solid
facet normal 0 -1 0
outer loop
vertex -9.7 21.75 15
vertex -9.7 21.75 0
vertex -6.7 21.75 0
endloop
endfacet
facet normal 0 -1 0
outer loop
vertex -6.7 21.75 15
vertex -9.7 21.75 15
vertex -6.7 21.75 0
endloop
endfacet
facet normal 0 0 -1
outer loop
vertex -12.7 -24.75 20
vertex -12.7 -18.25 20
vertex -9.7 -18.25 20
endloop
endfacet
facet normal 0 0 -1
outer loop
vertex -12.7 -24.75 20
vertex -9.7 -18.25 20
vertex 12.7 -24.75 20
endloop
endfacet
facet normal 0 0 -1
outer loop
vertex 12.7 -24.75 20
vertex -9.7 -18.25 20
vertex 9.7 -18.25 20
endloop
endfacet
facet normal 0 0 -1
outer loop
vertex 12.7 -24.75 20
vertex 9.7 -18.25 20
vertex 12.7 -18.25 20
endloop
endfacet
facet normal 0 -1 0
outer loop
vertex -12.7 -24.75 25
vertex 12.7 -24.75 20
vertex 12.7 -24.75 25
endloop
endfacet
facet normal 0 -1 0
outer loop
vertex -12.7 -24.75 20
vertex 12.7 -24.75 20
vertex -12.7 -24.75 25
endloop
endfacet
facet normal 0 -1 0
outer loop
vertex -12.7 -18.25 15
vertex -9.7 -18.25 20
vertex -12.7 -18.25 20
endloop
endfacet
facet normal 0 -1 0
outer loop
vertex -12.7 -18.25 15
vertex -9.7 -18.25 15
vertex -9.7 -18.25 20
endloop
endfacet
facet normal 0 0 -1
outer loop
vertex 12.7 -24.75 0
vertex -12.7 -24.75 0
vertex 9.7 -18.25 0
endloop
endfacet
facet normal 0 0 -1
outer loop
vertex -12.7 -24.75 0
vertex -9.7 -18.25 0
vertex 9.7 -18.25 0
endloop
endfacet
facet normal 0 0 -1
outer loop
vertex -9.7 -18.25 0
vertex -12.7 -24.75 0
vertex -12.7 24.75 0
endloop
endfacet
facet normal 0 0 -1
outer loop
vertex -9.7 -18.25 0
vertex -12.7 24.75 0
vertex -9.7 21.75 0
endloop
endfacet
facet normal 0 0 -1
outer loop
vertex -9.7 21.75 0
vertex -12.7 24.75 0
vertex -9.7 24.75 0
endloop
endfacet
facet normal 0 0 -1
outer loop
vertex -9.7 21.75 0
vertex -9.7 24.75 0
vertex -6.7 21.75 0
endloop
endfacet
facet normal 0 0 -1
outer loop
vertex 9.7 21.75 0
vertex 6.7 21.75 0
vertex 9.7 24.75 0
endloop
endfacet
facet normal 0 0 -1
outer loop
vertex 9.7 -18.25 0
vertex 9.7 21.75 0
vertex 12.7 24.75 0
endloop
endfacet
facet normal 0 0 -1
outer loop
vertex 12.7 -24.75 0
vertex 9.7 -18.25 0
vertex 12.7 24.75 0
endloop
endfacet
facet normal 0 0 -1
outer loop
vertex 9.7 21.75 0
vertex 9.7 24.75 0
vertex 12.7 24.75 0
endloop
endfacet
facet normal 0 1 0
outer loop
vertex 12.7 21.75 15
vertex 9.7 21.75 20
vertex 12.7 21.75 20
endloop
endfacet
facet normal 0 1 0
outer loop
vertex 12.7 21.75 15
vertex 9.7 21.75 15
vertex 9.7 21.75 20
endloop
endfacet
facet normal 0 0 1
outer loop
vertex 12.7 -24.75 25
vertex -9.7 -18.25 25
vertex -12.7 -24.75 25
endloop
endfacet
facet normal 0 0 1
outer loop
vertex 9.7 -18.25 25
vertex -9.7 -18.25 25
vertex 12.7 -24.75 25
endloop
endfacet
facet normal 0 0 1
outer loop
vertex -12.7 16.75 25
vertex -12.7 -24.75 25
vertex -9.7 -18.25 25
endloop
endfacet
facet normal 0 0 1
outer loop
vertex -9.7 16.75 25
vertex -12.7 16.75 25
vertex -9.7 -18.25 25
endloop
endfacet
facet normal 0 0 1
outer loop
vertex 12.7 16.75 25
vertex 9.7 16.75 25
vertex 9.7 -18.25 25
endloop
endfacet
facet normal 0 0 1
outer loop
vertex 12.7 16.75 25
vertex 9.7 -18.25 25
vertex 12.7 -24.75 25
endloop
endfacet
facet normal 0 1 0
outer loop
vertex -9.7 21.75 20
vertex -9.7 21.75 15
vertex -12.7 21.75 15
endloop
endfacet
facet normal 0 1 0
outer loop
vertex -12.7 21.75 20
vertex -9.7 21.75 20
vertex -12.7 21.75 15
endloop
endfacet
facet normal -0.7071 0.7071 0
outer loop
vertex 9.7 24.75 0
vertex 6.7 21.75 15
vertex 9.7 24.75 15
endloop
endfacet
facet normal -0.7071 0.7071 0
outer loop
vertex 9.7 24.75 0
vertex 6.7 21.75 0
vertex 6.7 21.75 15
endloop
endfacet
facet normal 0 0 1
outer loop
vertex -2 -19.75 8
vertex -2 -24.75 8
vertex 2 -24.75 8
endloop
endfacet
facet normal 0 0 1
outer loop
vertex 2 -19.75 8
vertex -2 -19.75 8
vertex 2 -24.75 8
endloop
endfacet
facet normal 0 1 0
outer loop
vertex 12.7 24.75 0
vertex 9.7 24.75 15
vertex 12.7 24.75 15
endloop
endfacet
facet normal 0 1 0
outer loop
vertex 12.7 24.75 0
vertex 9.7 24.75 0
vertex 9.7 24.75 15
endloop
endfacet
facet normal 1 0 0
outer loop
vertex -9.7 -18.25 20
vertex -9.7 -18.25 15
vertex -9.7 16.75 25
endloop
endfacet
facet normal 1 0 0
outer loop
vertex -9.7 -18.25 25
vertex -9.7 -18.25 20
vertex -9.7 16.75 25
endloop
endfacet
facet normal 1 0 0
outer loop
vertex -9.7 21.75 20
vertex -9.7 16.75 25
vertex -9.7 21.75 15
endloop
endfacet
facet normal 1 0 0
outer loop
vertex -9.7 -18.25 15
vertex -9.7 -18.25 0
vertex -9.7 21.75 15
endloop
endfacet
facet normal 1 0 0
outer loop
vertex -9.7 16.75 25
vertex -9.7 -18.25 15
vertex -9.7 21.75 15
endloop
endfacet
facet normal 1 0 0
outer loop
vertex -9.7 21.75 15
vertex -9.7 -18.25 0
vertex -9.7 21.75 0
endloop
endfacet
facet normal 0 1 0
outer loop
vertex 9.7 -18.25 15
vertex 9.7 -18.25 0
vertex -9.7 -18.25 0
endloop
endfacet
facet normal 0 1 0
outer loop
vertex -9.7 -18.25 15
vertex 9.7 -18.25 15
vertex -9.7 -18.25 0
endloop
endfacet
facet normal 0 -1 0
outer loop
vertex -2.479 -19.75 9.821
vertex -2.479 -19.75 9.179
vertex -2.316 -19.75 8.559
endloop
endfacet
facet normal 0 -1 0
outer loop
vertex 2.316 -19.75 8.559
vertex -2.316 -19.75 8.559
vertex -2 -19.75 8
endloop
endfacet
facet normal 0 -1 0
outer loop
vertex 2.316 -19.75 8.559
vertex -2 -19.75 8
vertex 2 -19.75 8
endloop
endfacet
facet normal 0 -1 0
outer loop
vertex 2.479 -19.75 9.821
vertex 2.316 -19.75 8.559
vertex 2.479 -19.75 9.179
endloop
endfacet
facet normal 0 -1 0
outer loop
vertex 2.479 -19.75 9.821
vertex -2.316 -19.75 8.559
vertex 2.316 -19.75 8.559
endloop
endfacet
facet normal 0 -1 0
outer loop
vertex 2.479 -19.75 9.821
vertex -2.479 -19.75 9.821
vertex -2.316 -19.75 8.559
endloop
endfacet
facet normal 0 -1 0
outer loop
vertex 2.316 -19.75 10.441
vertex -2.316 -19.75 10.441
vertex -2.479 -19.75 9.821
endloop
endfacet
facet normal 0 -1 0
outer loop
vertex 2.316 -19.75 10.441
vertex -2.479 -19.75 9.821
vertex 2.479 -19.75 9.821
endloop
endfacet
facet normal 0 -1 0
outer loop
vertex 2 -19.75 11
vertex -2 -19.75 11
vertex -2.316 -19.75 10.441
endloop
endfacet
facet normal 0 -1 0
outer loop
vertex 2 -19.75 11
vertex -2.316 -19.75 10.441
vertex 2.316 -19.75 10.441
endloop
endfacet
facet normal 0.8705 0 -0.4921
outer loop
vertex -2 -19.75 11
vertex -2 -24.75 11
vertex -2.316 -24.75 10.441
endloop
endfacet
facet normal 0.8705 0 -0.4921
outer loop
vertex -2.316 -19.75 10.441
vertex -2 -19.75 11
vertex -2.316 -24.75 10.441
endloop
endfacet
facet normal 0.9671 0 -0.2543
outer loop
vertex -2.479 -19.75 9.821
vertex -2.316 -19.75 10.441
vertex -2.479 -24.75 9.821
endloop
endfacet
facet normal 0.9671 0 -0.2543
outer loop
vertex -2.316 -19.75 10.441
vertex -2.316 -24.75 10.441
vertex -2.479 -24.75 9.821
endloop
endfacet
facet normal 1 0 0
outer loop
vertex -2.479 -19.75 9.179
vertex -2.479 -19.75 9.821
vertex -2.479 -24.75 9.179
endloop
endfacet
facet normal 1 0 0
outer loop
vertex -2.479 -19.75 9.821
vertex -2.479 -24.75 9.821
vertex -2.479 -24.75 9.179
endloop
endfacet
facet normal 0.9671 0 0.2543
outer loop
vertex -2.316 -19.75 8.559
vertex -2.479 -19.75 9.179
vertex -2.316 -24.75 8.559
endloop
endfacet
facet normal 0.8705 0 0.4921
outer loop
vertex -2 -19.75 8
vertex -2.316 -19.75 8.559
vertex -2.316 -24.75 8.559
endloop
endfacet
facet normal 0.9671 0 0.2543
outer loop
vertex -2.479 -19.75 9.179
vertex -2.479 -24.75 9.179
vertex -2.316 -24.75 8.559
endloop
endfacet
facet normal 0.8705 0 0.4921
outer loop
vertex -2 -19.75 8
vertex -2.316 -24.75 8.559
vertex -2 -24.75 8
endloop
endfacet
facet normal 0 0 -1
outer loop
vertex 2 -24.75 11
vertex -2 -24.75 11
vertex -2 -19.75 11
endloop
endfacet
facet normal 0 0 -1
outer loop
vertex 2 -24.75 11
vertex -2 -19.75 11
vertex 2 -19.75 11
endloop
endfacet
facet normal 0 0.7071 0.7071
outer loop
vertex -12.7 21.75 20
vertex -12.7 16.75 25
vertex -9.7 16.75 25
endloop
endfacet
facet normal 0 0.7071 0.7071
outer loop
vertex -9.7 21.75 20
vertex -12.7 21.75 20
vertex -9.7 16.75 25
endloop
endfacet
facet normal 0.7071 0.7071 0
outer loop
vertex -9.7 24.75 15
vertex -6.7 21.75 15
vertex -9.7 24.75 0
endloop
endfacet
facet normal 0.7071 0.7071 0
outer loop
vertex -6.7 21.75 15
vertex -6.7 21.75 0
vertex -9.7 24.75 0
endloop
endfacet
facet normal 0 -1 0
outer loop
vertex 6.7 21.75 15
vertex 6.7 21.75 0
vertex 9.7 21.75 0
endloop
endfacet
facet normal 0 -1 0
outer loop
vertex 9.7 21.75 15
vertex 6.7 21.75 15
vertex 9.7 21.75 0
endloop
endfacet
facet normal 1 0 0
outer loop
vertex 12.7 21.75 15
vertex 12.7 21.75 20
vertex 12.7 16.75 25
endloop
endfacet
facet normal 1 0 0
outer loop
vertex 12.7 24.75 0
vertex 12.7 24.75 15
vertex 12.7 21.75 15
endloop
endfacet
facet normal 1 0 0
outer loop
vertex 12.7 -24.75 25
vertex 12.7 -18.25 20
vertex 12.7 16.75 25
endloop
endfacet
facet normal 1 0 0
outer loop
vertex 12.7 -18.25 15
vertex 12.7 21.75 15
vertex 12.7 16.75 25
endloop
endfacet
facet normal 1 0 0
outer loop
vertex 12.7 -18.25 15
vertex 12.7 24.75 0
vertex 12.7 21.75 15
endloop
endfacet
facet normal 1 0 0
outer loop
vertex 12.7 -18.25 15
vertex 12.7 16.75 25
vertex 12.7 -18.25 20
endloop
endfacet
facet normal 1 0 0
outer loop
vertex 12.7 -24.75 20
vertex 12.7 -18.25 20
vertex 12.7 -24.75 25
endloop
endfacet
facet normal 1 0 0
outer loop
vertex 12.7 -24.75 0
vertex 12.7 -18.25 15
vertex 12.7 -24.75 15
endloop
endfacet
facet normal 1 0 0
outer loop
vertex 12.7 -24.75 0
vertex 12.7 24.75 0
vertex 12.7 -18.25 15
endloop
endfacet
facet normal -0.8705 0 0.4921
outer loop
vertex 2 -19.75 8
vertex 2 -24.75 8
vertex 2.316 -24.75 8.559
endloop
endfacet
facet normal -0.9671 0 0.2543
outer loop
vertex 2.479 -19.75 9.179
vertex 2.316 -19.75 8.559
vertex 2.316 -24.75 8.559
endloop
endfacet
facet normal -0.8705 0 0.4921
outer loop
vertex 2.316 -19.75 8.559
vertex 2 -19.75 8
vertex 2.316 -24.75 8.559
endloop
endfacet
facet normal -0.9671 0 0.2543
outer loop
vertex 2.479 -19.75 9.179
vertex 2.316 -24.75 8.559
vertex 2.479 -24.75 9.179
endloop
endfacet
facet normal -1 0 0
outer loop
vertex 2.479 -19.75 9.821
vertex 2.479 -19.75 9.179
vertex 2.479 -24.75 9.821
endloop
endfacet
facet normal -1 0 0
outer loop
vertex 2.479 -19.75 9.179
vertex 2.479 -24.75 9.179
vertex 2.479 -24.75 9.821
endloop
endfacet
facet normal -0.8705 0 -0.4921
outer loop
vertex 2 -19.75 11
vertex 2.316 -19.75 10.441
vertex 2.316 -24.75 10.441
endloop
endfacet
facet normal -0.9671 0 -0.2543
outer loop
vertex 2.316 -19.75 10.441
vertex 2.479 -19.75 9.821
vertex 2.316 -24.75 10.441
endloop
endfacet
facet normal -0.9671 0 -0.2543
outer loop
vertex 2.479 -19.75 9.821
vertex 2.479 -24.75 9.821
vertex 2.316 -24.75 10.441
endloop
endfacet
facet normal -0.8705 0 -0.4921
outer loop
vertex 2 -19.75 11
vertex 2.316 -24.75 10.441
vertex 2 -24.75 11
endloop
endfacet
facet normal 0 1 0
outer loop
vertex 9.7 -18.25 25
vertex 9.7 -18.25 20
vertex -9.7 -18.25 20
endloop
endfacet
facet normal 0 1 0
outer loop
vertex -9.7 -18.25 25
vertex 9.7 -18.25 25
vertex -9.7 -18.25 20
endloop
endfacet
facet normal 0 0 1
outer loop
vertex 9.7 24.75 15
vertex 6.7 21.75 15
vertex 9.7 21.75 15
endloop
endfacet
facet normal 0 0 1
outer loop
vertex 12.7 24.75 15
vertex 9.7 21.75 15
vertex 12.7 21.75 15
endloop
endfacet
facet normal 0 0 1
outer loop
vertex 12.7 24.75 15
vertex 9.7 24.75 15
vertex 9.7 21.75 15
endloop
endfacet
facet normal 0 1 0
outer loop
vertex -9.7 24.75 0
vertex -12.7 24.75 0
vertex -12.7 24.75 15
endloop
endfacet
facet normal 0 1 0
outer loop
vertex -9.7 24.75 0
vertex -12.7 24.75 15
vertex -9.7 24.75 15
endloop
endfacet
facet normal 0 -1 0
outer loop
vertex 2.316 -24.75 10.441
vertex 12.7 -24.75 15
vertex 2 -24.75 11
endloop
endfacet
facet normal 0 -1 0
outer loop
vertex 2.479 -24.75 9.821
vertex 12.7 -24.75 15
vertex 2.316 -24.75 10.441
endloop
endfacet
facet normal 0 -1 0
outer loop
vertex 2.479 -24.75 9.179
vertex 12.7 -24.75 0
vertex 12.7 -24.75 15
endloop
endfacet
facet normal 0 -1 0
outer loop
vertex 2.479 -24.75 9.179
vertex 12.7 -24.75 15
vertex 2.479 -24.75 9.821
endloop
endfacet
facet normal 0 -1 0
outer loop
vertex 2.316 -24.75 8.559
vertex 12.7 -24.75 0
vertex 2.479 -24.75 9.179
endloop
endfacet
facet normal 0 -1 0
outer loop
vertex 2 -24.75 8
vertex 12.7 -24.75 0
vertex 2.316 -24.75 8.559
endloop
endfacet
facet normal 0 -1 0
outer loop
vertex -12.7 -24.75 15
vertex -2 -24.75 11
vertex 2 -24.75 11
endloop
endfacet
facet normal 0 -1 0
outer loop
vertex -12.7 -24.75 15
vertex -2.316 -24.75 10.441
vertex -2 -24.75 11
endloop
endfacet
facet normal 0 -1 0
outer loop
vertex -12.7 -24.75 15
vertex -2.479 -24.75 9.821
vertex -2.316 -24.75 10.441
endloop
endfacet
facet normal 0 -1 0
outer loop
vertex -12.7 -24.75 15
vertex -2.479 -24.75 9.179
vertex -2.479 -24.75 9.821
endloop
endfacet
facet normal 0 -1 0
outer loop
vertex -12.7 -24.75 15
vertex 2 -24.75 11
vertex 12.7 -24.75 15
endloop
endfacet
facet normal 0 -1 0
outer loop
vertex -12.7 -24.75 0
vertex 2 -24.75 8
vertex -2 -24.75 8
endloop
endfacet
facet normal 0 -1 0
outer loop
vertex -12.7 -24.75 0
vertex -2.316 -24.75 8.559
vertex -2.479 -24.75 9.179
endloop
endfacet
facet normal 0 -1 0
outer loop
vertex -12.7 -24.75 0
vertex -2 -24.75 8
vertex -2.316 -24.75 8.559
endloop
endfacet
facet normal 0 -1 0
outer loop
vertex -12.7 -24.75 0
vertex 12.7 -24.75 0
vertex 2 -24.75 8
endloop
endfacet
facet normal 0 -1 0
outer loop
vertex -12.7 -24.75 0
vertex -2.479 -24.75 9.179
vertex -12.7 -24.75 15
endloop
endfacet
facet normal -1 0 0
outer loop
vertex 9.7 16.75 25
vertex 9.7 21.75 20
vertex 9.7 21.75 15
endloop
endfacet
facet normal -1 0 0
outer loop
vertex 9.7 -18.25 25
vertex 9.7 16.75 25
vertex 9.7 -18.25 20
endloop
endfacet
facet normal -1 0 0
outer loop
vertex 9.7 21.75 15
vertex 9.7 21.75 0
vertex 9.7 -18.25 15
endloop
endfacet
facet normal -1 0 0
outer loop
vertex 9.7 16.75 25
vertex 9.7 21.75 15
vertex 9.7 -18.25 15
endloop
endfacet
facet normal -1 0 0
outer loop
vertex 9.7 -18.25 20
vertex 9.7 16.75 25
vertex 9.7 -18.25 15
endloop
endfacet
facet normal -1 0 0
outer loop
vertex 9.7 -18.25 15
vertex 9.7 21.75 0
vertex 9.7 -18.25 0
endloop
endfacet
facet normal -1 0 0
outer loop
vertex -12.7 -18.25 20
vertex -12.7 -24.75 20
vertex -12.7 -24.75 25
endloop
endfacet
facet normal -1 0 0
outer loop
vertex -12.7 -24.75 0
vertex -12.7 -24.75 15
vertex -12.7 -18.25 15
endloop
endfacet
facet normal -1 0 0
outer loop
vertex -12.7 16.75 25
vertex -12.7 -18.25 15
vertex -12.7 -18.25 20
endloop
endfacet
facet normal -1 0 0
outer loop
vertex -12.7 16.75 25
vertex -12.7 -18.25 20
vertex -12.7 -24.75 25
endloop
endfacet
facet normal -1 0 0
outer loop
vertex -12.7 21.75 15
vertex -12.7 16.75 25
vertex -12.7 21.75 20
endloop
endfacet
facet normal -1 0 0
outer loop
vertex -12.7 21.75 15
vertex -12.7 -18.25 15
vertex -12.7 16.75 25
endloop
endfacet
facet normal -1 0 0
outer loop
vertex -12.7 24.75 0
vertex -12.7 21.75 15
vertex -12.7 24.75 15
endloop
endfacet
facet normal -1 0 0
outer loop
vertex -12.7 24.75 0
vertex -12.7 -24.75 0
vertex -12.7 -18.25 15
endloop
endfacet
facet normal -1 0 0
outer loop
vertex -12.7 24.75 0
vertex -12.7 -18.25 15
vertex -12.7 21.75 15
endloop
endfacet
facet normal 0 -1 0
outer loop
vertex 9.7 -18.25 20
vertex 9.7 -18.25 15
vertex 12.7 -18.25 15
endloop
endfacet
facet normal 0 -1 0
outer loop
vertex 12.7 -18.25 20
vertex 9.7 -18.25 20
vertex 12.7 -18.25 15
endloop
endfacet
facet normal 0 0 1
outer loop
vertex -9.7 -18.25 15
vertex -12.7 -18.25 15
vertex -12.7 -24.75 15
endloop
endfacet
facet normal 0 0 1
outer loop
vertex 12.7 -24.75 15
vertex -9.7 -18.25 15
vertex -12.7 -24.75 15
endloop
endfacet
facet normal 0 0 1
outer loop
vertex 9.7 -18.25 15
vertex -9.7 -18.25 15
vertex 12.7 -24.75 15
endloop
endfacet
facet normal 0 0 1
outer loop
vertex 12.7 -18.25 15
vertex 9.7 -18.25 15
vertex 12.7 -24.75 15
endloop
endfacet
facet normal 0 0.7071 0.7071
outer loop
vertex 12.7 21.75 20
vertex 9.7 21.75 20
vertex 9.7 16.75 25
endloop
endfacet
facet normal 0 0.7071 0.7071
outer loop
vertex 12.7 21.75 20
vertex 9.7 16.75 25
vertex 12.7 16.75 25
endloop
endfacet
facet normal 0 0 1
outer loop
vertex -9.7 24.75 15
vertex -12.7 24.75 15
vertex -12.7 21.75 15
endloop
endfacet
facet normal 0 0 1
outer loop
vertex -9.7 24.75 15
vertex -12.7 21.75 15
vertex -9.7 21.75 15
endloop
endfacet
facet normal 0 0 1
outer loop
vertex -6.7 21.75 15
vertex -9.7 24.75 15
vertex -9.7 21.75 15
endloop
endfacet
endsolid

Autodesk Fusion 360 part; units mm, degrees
sketch "Schizzo1" plane through (0, 0, 0) normal (0, 0, 1) x (1, 0, 0)
  line L0 (12.7, -24.75) -> (-12.7, -24.75)
  line L1 (-12.7, -24.75) -> (-12.7, 24.75)
  line L2 (12.7, 24.75) -> (12.7, -24.75)
  line L3 (12.7, -24.75) -> (-12.7, 24.75) construction
  line L4 (-12.7, -24.75) -> (12.7, 24.75) construction
  line L5 (9.7, -18.25) -> (-9.7, -18.25)
  line L6 (9.7, 21.75) -> (9.7, -18.25)
  line L7 (-9.7, -18.25) -> (-9.7, 21.75)
  line L8 (-12.7, 24.75) -> (-9.7, 24.75)
  line L9 (9.7, 24.75) -> (12.7, 24.75)
  line L10 (-9.7, 21.75) -> (-6.7, 21.75)
  line L11 (-6.7, 21.75) -> (-9.7, 24.75)
  line L12 (9.7, 21.75) -> (6.7, 21.75)
  line L13 (6.7, 21.75) -> (9.7, 24.75)
  line L14 (-9.7, -18.25) -> (-12.7, -18.25)
  line L15 (9.7, -18.25) -> (12.7, -18.25)
  line L16 (-9.7, 21.75) -> (-12.7, 21.75)
  line L17 (9.7, 21.75) -> (12.7, 21.75)
  dimension "d15" = 19.4
  dimension "d16" = 3
  dimension "d17" = 3
  dimension "d18" = 6.5
  dimension "d19" = 43
  dimension "d20" = 3
  dimension "d22" = 3
  dimension "d23" = 3
  dimension "d24" = 3
extrude "Estrusione2" add sketch "Schizzo1" along normal blind 25 contours L0 L1 L2 L5 L14 L15 | L2 L6 L15 L17 | L1 L7 L14 L16
extrude "Estrusione3" add sketch "Schizzo1" along normal blind 15 contours L2 L9 L12 L13 L17 | L1 L8 L10 L11 L16
extrude "Estrusione4" cut sketch "Schizzo1" along normal blind 5 from surface at 15 contours L0 L1 L2 L5 L14 L15
chamfer "Smusso1" distance 5 angle 45 2 edges at (11.2, 21.75, 25) (-11.2, 21.75, 25)
sketch "Schizzo2" plane through (0, -24.75, 0) normal (0, -1, 0) x (1, 0, 0)
  line L0 (12.7, 15) -> (-12.7, 15)
  line L1 (-12.7, 15) -> (-12.7, 0)
  line L2 (-12.7, 0) -> (12.7, 0)
  line L3 (12.7, 0) -> (12.7, 15)
  line L4 (0, 15) -> (0, 0) construction
  circle A0 centre (0, 9.5) radius 2.5
  line L5 (-2, 11) -> (2, 11)
  line L6 (-2, 8) -> (2, 8)
  line L7 (-2.5, 9.5) -> (2.5, 9.5) construction
  dimension "d33" = 5
  dimension "d34" = 3
  dimension "d35" = 3
extrude "Estrusione5" cut sketch "Schizzo2" against normal blind 5 contours A0 L5 L6
equation "d17 = d16"
equation "d20 = spessore"
equation "spessore = 3 mm"
equation "d22 = spessore"
equation "d23 = spessore"
equation "d24 = spessore"
